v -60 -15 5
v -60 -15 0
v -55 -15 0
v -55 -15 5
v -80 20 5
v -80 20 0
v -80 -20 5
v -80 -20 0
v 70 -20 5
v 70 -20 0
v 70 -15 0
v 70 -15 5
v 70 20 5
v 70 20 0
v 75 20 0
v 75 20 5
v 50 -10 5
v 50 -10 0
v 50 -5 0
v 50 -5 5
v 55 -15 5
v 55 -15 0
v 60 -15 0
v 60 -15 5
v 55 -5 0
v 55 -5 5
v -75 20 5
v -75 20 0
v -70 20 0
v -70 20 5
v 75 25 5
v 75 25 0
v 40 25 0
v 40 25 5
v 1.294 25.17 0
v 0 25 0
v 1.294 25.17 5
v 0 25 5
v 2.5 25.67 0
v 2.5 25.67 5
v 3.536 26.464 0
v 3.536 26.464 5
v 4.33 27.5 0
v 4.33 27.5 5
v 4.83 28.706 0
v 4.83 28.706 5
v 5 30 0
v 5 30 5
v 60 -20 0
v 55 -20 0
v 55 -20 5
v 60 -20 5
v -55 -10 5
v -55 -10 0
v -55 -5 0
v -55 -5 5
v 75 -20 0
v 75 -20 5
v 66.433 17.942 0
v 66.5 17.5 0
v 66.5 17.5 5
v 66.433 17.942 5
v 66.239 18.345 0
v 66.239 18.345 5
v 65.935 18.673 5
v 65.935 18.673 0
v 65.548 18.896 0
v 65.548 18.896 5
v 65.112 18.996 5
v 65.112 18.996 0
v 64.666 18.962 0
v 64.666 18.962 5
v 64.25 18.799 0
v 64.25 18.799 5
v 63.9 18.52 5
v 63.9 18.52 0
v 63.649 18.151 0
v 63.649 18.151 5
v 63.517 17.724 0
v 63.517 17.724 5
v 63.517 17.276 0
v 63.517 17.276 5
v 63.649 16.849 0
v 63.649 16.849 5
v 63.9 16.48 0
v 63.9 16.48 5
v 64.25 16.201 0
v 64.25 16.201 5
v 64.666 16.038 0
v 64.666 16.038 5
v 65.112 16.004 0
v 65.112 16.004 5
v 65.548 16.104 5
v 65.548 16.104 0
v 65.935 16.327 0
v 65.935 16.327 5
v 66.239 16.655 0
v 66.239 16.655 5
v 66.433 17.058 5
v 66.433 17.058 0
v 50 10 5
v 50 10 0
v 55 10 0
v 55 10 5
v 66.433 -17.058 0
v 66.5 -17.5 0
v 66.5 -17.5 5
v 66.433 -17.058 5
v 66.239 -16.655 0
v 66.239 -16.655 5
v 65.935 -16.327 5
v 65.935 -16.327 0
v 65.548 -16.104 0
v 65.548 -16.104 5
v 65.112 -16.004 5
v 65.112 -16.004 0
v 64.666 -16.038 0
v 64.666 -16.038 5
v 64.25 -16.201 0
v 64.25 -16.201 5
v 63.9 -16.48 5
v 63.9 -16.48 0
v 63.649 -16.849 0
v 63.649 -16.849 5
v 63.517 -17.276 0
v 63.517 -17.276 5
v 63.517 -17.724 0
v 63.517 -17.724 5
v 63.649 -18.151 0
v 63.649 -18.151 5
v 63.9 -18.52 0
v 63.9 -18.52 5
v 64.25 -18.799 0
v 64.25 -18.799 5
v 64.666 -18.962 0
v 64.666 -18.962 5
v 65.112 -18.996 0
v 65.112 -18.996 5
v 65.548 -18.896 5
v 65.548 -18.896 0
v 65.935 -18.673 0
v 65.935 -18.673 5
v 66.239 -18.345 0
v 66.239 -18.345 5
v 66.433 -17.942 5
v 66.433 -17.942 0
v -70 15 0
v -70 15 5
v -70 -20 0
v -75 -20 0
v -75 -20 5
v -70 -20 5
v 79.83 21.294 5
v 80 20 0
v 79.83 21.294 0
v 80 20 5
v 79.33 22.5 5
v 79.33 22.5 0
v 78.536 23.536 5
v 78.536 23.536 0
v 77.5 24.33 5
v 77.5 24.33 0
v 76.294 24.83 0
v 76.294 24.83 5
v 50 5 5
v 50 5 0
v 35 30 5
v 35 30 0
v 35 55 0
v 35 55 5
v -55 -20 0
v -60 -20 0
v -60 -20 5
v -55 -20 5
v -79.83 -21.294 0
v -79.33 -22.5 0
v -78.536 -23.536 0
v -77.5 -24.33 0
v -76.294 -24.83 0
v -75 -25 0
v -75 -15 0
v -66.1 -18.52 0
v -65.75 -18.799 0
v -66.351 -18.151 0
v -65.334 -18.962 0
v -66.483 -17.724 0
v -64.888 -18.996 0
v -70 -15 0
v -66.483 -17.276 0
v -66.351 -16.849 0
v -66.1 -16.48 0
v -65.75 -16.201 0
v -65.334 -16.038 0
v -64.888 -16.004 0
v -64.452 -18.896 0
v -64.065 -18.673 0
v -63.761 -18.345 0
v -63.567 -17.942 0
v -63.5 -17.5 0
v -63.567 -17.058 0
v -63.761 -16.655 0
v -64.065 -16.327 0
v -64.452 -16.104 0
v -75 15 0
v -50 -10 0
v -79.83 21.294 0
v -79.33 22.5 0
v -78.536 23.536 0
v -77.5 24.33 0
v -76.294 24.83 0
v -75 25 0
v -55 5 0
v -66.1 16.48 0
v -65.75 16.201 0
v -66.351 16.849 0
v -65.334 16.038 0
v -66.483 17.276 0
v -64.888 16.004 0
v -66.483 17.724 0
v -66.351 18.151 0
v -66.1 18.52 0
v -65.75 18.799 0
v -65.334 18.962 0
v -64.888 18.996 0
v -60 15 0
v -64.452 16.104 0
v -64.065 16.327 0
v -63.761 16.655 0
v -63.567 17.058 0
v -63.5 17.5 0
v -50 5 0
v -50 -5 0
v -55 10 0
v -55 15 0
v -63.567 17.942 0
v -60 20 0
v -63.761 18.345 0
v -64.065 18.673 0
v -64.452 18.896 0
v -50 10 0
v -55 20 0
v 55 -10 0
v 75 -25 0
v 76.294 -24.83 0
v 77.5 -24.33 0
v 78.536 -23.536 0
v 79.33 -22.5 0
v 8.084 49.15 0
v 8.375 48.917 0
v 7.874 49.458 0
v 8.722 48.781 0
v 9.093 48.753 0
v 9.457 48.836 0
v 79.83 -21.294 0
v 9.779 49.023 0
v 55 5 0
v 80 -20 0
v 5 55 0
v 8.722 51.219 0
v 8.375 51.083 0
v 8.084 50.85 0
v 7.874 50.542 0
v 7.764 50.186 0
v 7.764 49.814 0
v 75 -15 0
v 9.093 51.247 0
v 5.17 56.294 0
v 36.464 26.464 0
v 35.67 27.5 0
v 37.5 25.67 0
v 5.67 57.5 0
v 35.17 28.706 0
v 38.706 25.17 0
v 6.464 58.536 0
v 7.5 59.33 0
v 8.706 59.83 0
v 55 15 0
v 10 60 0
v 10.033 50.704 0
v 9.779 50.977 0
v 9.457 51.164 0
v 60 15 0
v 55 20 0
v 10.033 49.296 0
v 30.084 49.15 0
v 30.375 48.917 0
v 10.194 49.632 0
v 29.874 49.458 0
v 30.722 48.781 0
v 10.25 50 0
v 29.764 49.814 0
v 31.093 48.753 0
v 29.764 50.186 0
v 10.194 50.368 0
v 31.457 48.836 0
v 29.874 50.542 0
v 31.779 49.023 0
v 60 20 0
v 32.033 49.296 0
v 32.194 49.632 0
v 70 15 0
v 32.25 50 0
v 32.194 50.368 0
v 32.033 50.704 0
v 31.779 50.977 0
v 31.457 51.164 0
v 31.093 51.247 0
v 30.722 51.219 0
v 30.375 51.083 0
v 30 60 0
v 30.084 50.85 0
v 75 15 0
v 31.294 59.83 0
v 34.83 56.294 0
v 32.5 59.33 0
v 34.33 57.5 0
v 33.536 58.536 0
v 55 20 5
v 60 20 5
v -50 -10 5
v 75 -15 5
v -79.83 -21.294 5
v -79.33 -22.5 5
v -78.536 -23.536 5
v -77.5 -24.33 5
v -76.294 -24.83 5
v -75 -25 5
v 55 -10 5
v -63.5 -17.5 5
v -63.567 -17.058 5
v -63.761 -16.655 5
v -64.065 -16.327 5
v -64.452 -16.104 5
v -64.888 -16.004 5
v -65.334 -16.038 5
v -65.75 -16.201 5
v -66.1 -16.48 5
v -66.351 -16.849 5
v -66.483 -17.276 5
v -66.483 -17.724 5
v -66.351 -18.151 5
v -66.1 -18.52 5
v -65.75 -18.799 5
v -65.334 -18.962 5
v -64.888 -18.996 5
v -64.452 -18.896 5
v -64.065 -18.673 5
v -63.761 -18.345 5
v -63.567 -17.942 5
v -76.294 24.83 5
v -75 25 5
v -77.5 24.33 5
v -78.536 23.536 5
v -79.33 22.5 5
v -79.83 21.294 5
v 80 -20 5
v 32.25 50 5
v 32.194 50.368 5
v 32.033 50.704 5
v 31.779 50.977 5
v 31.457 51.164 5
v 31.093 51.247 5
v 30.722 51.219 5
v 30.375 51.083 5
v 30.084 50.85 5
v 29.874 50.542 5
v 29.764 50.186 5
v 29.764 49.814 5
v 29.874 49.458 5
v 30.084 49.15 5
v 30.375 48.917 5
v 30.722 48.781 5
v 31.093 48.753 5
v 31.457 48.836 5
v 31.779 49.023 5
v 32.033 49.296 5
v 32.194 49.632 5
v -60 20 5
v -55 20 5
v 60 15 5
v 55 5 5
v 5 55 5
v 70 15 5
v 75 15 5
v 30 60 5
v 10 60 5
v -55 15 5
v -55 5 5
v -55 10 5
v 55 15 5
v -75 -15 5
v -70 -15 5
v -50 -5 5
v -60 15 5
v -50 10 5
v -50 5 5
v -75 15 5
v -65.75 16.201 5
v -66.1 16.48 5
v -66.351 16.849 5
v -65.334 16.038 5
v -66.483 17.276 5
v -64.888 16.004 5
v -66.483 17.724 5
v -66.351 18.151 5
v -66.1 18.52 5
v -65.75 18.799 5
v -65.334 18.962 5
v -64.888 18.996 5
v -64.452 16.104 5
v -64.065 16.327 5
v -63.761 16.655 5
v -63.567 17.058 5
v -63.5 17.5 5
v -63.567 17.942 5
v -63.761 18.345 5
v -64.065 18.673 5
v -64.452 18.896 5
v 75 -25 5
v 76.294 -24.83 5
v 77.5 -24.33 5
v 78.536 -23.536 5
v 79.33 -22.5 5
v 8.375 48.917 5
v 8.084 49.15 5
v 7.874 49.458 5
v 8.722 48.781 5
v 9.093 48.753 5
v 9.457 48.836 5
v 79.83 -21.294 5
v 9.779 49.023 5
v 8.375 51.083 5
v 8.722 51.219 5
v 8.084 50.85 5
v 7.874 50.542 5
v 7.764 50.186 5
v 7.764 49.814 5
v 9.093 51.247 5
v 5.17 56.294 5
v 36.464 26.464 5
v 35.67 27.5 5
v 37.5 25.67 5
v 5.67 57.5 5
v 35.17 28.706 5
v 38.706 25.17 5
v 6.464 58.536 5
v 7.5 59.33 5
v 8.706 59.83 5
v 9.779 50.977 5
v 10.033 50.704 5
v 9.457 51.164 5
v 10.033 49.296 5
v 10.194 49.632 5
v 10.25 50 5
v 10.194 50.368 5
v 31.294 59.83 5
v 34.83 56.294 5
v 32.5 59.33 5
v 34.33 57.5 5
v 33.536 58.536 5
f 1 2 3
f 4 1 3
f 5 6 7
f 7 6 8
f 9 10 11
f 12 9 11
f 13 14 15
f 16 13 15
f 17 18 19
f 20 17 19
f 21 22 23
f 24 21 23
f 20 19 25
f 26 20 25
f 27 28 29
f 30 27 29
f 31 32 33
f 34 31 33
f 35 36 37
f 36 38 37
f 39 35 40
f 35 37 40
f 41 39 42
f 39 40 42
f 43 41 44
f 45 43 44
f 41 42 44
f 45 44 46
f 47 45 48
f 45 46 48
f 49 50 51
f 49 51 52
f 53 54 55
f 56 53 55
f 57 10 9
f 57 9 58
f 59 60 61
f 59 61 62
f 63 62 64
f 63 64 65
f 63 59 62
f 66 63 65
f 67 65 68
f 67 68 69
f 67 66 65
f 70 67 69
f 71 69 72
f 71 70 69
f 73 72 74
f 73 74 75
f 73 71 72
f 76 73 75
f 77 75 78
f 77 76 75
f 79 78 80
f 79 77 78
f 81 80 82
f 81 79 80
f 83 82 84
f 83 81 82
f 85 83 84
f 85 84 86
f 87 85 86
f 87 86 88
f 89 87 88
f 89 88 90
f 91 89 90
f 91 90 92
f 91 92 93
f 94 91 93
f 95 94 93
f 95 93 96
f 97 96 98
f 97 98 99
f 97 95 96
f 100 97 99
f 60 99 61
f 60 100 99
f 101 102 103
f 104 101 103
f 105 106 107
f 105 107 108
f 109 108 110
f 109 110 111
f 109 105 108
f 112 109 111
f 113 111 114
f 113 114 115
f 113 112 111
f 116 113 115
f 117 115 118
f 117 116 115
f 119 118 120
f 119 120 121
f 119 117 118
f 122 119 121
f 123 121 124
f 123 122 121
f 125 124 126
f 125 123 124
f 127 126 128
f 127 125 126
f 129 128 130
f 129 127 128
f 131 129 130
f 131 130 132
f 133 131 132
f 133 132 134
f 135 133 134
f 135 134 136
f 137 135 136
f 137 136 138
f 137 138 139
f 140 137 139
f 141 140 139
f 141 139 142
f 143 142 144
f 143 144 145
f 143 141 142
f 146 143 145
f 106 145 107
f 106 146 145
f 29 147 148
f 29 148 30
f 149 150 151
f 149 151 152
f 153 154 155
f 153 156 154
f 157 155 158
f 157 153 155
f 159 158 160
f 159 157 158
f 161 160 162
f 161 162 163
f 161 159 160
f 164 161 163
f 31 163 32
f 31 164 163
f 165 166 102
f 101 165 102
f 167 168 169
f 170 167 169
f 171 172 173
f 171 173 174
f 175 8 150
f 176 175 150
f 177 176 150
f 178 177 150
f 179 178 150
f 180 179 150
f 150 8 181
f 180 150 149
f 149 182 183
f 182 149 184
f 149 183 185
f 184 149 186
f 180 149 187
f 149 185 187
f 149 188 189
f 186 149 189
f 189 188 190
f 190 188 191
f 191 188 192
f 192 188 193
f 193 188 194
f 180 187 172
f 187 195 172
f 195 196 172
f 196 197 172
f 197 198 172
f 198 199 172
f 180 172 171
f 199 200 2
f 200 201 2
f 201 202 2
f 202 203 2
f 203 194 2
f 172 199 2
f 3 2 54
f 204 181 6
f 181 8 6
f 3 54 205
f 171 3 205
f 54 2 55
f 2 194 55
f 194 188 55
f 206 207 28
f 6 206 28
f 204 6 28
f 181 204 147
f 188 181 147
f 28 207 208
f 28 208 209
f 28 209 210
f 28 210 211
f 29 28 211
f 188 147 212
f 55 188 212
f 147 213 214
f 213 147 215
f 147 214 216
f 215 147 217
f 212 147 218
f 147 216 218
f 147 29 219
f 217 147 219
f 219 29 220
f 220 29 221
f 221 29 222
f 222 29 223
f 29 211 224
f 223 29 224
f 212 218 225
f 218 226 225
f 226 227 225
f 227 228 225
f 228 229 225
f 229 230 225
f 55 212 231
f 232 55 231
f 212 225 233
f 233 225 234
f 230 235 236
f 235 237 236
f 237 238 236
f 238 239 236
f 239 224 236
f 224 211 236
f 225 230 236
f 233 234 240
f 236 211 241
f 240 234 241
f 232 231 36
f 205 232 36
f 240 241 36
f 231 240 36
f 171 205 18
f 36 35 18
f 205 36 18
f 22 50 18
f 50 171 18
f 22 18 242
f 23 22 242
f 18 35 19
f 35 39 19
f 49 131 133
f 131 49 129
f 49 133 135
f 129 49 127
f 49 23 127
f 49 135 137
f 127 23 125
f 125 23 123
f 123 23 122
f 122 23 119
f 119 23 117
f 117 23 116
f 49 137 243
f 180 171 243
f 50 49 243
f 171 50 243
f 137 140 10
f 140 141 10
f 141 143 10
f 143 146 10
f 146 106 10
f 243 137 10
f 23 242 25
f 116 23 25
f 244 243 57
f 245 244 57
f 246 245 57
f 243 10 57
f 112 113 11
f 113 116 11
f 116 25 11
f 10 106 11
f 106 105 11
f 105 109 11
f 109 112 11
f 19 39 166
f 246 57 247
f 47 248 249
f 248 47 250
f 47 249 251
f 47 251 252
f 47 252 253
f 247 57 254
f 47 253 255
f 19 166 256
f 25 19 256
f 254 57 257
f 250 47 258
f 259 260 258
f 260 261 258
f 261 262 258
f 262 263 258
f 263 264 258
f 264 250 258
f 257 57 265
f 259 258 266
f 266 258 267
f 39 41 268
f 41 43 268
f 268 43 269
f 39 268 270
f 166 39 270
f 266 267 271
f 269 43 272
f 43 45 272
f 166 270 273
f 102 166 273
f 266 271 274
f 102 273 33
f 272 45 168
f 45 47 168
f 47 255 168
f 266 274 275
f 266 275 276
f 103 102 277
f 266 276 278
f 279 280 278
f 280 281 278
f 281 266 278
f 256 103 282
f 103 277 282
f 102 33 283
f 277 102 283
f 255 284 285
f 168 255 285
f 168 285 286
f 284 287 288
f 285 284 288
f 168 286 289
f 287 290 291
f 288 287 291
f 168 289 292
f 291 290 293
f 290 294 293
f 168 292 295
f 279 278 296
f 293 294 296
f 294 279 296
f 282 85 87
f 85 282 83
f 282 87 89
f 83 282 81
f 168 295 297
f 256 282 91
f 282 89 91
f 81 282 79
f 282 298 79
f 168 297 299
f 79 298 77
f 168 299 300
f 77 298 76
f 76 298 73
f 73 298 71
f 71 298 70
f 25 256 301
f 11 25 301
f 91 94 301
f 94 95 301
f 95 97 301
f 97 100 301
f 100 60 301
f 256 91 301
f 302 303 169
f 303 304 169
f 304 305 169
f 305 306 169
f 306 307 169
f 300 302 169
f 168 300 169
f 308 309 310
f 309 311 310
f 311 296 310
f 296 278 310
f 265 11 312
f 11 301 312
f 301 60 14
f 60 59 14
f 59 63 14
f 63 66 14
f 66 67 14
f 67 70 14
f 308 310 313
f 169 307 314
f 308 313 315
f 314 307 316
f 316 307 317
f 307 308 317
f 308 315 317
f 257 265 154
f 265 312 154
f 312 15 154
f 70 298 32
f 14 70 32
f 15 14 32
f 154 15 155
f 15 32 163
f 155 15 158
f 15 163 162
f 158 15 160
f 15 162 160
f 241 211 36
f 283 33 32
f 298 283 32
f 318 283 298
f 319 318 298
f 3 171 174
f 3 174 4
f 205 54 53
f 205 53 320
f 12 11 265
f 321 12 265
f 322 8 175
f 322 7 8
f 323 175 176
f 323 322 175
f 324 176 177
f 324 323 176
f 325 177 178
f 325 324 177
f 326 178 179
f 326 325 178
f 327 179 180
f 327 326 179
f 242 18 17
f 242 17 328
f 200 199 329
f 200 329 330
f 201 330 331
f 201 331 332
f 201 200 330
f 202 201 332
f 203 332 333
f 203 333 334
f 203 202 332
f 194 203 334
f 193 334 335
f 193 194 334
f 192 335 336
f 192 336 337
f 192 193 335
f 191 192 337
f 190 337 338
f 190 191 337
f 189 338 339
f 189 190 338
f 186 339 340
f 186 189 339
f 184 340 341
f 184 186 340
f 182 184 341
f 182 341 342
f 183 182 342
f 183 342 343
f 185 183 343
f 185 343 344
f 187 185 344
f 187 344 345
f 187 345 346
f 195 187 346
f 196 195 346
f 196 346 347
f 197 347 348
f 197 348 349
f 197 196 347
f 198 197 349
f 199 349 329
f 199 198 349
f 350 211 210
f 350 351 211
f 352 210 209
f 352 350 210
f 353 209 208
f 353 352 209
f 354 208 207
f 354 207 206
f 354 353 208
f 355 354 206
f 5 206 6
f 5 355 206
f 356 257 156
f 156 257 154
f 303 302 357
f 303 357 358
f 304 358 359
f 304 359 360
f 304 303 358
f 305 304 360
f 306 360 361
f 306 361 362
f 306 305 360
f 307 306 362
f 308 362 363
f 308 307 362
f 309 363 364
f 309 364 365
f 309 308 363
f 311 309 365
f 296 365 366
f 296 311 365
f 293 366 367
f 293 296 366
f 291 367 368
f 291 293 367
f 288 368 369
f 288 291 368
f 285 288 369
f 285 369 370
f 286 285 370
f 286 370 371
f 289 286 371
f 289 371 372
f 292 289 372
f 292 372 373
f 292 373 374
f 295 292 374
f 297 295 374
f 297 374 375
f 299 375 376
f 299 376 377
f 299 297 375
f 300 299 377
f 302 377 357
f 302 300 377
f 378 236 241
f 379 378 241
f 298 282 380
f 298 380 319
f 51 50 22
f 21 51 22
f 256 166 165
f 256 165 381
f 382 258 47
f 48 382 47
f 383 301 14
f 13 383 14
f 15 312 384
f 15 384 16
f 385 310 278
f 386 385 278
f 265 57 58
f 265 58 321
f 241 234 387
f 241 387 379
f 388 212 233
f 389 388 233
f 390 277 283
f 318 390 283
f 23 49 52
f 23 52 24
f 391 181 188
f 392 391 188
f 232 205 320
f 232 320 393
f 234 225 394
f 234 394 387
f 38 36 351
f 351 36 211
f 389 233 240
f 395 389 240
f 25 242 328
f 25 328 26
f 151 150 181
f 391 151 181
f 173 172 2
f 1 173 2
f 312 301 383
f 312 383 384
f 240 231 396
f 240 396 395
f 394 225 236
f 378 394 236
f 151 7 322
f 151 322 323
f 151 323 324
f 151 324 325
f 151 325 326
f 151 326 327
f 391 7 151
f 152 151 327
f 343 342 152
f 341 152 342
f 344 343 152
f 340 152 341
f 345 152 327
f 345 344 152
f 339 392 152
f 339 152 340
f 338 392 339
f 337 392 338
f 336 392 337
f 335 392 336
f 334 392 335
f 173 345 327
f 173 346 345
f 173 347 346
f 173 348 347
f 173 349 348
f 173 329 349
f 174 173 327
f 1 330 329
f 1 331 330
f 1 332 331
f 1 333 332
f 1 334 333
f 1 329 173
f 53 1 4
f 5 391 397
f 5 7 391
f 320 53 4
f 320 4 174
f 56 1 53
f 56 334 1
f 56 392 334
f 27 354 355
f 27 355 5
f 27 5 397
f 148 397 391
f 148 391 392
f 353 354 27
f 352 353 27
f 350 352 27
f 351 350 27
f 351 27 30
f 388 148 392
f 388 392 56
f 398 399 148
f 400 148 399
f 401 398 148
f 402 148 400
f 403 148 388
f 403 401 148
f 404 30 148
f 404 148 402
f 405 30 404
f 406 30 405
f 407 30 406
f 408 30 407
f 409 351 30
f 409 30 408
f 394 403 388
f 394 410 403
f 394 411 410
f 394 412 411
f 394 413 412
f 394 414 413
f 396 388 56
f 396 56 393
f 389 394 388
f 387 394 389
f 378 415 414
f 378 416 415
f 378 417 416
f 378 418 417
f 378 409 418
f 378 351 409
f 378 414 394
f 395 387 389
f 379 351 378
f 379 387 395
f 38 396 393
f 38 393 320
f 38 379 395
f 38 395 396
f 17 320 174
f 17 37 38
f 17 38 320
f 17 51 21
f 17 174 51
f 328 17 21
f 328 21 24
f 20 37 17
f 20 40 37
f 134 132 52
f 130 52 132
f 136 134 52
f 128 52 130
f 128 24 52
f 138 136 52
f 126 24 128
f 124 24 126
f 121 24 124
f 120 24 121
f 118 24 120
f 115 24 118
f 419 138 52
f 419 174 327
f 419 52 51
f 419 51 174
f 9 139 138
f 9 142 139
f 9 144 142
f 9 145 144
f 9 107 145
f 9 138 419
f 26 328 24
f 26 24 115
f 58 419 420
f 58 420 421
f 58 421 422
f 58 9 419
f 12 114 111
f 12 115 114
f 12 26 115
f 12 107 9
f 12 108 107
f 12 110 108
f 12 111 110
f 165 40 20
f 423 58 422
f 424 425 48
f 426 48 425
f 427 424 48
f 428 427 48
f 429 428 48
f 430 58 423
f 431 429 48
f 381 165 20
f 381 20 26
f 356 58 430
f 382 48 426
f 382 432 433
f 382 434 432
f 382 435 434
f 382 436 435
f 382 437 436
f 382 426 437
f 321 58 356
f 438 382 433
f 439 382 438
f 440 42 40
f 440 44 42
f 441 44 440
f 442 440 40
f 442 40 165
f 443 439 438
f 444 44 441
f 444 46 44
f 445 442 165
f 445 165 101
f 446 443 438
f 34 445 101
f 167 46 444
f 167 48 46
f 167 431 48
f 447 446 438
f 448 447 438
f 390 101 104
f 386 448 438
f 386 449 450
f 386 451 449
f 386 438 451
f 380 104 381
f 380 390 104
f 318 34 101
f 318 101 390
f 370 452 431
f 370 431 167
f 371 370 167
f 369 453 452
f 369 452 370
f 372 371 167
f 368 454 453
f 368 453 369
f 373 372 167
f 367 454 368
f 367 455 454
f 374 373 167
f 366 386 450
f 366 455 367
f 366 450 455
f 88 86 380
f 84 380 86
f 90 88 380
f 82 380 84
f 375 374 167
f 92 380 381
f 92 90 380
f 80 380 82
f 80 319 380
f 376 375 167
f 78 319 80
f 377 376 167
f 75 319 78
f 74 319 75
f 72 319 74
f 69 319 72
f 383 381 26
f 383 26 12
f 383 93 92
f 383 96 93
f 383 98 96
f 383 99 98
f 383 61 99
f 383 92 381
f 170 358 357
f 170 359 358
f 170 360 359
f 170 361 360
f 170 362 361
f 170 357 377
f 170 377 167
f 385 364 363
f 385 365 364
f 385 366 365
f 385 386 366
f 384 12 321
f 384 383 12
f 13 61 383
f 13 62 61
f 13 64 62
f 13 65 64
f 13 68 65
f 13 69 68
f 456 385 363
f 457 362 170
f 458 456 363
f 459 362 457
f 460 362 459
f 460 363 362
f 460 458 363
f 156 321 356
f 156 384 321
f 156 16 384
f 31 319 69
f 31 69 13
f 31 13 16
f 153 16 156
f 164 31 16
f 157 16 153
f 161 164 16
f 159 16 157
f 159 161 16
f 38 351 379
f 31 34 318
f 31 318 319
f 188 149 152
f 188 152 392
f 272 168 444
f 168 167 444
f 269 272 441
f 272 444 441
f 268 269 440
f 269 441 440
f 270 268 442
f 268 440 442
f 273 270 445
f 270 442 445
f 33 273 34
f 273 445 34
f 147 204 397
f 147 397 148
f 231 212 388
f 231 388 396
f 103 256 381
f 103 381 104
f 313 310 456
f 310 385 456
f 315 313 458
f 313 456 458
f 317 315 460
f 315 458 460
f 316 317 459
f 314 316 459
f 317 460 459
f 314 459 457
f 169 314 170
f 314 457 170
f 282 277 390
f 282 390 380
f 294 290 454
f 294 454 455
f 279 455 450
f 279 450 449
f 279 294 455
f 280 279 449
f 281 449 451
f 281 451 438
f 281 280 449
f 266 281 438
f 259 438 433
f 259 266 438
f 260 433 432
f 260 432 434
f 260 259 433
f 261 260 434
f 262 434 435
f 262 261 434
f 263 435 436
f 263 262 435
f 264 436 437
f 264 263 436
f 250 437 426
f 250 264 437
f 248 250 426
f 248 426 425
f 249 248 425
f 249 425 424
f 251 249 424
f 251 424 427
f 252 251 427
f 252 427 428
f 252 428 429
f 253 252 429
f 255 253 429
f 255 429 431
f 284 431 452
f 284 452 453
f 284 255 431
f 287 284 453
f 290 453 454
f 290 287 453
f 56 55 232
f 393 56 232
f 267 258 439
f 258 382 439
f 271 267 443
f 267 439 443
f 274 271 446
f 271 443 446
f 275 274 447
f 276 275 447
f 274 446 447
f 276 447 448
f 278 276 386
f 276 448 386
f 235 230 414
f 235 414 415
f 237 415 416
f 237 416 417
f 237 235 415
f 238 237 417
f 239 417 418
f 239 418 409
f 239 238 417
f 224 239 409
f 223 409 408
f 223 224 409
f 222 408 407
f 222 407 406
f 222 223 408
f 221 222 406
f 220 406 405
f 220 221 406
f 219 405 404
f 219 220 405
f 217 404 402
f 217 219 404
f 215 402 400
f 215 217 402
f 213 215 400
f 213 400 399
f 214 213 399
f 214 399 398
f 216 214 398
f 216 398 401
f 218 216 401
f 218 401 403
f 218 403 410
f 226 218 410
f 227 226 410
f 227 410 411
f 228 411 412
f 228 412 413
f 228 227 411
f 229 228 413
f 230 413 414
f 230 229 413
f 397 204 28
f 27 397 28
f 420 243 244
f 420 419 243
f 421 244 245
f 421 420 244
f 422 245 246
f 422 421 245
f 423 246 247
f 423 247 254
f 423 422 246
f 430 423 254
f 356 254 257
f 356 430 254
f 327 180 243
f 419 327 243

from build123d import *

# Parameters (mm, degrees)
BOSS_EXTRUDE1_OUTLINE_W   = 5
BOSS_EXTRUDE1_OUTLINE_H   = 5
BOSS_EXTRUDE1_OUTLINE_R   = 1.5
BOSS_EXTRUDE1_OUTLINE_R_2 = 1.25
BOSS_EXTRUDE1_DEPTH       = 5
FILLET1_R                 = 5


# Read off the part's stored shape, not the designer's step: Boss-Extrude1
with BuildPart() as part:
    # Boss-Extrude1 outline → Boss-Extrude1 (new body)
    with BuildSketch(Plane.XY):
        Polygon((5, 25), (-80, 25), (-80, -25), (80, -25), (80, 25), (35, 25), (35, 60), (5, 60), align=None)
        with Locations((-72.5, -17.5)):
            Rectangle(BOSS_EXTRUDE1_OUTLINE_W, BOSS_EXTRUDE1_OUTLINE_H, mode=Mode.SUBTRACT)
        with Locations((-65, -17.5)):
            Circle(BOSS_EXTRUDE1_OUTLINE_R, mode=Mode.SUBTRACT)
        with Locations((-57.5, -17.5)):
            Rectangle(BOSS_EXTRUDE1_OUTLINE_W, BOSS_EXTRUDE1_OUTLINE_H, mode=Mode.SUBTRACT)
        with Locations((-52.5, -7.5)):
            Rectangle(BOSS_EXTRUDE1_OUTLINE_W, BOSS_EXTRUDE1_OUTLINE_H, mode=Mode.SUBTRACT)
        with Locations((-52.5, 7.5)):
            Rectangle(BOSS_EXTRUDE1_OUTLINE_W, BOSS_EXTRUDE1_OUTLINE_H, mode=Mode.SUBTRACT)
        with Locations((57.5, -17.5)):
            Rectangle(BOSS_EXTRUDE1_OUTLINE_W, BOSS_EXTRUDE1_OUTLINE_H, mode=Mode.SUBTRACT)
        with Locations((65, -17.5)):
            Circle(BOSS_EXTRUDE1_OUTLINE_R, mode=Mode.SUBTRACT)
        with Locations((72.5, -17.5)):
            Rectangle(BOSS_EXTRUDE1_OUTLINE_W, BOSS_EXTRUDE1_OUTLINE_H, mode=Mode.SUBTRACT)
        with Locations((52.5, -7.5)):
            Rectangle(BOSS_EXTRUDE1_OUTLINE_W, BOSS_EXTRUDE1_OUTLINE_H, mode=Mode.SUBTRACT)
        with Locations((52.5, 7.5)):
            Rectangle(BOSS_EXTRUDE1_OUTLINE_W, BOSS_EXTRUDE1_OUTLINE_H, mode=Mode.SUBTRACT)
        with Locations((-72.5, 17.5)):
            Rectangle(BOSS_EXTRUDE1_OUTLINE_W, BOSS_EXTRUDE1_OUTLINE_H, mode=Mode.SUBTRACT)
        with Locations((-65, 17.5)):
            Circle(BOSS_EXTRUDE1_OUTLINE_R, mode=Mode.SUBTRACT)
        with Locations((-57.5, 17.5)):
            Rectangle(BOSS_EXTRUDE1_OUTLINE_W, BOSS_EXTRUDE1_OUTLINE_H, mode=Mode.SUBTRACT)
        with Locations((57.5, 17.5)):
            Rectangle(BOSS_EXTRUDE1_OUTLINE_W, BOSS_EXTRUDE1_OUTLINE_H, mode=Mode.SUBTRACT)
        with Locations((65, 17.5)):
            Circle(BOSS_EXTRUDE1_OUTLINE_R, mode=Mode.SUBTRACT)
        with Locations((72.5, 17.5)):
            Rectangle(BOSS_EXTRUDE1_OUTLINE_W, BOSS_EXTRUDE1_OUTLINE_H, mode=Mode.SUBTRACT)
        with Locations((9, 50)):
            Circle(BOSS_EXTRUDE1_OUTLINE_R_2, mode=Mode.SUBTRACT)
        with Locations((31, 50)):
            Circle(BOSS_EXTRUDE1_OUTLINE_R_2, mode=Mode.SUBTRACT)
    extrude(amount=BOSS_EXTRUDE1_DEPTH)

    # Fillet1
    fillet1_edges = [part.edges().sort_by_distance(p)[0] for p in [
        (5, 25, 2.5),
        (5, 60, 2.5),
        (35, 60, 2.5),
        (35, 25, 2.5),
        (80, 25, 2.5),
        (80, -25, 2.5),
        (-80, -25, 2.5),
        (-80, 25, 2.5),
    ]]
    fillet(fillet1_edges, radius=FILLET1_R)


solid = part.part
